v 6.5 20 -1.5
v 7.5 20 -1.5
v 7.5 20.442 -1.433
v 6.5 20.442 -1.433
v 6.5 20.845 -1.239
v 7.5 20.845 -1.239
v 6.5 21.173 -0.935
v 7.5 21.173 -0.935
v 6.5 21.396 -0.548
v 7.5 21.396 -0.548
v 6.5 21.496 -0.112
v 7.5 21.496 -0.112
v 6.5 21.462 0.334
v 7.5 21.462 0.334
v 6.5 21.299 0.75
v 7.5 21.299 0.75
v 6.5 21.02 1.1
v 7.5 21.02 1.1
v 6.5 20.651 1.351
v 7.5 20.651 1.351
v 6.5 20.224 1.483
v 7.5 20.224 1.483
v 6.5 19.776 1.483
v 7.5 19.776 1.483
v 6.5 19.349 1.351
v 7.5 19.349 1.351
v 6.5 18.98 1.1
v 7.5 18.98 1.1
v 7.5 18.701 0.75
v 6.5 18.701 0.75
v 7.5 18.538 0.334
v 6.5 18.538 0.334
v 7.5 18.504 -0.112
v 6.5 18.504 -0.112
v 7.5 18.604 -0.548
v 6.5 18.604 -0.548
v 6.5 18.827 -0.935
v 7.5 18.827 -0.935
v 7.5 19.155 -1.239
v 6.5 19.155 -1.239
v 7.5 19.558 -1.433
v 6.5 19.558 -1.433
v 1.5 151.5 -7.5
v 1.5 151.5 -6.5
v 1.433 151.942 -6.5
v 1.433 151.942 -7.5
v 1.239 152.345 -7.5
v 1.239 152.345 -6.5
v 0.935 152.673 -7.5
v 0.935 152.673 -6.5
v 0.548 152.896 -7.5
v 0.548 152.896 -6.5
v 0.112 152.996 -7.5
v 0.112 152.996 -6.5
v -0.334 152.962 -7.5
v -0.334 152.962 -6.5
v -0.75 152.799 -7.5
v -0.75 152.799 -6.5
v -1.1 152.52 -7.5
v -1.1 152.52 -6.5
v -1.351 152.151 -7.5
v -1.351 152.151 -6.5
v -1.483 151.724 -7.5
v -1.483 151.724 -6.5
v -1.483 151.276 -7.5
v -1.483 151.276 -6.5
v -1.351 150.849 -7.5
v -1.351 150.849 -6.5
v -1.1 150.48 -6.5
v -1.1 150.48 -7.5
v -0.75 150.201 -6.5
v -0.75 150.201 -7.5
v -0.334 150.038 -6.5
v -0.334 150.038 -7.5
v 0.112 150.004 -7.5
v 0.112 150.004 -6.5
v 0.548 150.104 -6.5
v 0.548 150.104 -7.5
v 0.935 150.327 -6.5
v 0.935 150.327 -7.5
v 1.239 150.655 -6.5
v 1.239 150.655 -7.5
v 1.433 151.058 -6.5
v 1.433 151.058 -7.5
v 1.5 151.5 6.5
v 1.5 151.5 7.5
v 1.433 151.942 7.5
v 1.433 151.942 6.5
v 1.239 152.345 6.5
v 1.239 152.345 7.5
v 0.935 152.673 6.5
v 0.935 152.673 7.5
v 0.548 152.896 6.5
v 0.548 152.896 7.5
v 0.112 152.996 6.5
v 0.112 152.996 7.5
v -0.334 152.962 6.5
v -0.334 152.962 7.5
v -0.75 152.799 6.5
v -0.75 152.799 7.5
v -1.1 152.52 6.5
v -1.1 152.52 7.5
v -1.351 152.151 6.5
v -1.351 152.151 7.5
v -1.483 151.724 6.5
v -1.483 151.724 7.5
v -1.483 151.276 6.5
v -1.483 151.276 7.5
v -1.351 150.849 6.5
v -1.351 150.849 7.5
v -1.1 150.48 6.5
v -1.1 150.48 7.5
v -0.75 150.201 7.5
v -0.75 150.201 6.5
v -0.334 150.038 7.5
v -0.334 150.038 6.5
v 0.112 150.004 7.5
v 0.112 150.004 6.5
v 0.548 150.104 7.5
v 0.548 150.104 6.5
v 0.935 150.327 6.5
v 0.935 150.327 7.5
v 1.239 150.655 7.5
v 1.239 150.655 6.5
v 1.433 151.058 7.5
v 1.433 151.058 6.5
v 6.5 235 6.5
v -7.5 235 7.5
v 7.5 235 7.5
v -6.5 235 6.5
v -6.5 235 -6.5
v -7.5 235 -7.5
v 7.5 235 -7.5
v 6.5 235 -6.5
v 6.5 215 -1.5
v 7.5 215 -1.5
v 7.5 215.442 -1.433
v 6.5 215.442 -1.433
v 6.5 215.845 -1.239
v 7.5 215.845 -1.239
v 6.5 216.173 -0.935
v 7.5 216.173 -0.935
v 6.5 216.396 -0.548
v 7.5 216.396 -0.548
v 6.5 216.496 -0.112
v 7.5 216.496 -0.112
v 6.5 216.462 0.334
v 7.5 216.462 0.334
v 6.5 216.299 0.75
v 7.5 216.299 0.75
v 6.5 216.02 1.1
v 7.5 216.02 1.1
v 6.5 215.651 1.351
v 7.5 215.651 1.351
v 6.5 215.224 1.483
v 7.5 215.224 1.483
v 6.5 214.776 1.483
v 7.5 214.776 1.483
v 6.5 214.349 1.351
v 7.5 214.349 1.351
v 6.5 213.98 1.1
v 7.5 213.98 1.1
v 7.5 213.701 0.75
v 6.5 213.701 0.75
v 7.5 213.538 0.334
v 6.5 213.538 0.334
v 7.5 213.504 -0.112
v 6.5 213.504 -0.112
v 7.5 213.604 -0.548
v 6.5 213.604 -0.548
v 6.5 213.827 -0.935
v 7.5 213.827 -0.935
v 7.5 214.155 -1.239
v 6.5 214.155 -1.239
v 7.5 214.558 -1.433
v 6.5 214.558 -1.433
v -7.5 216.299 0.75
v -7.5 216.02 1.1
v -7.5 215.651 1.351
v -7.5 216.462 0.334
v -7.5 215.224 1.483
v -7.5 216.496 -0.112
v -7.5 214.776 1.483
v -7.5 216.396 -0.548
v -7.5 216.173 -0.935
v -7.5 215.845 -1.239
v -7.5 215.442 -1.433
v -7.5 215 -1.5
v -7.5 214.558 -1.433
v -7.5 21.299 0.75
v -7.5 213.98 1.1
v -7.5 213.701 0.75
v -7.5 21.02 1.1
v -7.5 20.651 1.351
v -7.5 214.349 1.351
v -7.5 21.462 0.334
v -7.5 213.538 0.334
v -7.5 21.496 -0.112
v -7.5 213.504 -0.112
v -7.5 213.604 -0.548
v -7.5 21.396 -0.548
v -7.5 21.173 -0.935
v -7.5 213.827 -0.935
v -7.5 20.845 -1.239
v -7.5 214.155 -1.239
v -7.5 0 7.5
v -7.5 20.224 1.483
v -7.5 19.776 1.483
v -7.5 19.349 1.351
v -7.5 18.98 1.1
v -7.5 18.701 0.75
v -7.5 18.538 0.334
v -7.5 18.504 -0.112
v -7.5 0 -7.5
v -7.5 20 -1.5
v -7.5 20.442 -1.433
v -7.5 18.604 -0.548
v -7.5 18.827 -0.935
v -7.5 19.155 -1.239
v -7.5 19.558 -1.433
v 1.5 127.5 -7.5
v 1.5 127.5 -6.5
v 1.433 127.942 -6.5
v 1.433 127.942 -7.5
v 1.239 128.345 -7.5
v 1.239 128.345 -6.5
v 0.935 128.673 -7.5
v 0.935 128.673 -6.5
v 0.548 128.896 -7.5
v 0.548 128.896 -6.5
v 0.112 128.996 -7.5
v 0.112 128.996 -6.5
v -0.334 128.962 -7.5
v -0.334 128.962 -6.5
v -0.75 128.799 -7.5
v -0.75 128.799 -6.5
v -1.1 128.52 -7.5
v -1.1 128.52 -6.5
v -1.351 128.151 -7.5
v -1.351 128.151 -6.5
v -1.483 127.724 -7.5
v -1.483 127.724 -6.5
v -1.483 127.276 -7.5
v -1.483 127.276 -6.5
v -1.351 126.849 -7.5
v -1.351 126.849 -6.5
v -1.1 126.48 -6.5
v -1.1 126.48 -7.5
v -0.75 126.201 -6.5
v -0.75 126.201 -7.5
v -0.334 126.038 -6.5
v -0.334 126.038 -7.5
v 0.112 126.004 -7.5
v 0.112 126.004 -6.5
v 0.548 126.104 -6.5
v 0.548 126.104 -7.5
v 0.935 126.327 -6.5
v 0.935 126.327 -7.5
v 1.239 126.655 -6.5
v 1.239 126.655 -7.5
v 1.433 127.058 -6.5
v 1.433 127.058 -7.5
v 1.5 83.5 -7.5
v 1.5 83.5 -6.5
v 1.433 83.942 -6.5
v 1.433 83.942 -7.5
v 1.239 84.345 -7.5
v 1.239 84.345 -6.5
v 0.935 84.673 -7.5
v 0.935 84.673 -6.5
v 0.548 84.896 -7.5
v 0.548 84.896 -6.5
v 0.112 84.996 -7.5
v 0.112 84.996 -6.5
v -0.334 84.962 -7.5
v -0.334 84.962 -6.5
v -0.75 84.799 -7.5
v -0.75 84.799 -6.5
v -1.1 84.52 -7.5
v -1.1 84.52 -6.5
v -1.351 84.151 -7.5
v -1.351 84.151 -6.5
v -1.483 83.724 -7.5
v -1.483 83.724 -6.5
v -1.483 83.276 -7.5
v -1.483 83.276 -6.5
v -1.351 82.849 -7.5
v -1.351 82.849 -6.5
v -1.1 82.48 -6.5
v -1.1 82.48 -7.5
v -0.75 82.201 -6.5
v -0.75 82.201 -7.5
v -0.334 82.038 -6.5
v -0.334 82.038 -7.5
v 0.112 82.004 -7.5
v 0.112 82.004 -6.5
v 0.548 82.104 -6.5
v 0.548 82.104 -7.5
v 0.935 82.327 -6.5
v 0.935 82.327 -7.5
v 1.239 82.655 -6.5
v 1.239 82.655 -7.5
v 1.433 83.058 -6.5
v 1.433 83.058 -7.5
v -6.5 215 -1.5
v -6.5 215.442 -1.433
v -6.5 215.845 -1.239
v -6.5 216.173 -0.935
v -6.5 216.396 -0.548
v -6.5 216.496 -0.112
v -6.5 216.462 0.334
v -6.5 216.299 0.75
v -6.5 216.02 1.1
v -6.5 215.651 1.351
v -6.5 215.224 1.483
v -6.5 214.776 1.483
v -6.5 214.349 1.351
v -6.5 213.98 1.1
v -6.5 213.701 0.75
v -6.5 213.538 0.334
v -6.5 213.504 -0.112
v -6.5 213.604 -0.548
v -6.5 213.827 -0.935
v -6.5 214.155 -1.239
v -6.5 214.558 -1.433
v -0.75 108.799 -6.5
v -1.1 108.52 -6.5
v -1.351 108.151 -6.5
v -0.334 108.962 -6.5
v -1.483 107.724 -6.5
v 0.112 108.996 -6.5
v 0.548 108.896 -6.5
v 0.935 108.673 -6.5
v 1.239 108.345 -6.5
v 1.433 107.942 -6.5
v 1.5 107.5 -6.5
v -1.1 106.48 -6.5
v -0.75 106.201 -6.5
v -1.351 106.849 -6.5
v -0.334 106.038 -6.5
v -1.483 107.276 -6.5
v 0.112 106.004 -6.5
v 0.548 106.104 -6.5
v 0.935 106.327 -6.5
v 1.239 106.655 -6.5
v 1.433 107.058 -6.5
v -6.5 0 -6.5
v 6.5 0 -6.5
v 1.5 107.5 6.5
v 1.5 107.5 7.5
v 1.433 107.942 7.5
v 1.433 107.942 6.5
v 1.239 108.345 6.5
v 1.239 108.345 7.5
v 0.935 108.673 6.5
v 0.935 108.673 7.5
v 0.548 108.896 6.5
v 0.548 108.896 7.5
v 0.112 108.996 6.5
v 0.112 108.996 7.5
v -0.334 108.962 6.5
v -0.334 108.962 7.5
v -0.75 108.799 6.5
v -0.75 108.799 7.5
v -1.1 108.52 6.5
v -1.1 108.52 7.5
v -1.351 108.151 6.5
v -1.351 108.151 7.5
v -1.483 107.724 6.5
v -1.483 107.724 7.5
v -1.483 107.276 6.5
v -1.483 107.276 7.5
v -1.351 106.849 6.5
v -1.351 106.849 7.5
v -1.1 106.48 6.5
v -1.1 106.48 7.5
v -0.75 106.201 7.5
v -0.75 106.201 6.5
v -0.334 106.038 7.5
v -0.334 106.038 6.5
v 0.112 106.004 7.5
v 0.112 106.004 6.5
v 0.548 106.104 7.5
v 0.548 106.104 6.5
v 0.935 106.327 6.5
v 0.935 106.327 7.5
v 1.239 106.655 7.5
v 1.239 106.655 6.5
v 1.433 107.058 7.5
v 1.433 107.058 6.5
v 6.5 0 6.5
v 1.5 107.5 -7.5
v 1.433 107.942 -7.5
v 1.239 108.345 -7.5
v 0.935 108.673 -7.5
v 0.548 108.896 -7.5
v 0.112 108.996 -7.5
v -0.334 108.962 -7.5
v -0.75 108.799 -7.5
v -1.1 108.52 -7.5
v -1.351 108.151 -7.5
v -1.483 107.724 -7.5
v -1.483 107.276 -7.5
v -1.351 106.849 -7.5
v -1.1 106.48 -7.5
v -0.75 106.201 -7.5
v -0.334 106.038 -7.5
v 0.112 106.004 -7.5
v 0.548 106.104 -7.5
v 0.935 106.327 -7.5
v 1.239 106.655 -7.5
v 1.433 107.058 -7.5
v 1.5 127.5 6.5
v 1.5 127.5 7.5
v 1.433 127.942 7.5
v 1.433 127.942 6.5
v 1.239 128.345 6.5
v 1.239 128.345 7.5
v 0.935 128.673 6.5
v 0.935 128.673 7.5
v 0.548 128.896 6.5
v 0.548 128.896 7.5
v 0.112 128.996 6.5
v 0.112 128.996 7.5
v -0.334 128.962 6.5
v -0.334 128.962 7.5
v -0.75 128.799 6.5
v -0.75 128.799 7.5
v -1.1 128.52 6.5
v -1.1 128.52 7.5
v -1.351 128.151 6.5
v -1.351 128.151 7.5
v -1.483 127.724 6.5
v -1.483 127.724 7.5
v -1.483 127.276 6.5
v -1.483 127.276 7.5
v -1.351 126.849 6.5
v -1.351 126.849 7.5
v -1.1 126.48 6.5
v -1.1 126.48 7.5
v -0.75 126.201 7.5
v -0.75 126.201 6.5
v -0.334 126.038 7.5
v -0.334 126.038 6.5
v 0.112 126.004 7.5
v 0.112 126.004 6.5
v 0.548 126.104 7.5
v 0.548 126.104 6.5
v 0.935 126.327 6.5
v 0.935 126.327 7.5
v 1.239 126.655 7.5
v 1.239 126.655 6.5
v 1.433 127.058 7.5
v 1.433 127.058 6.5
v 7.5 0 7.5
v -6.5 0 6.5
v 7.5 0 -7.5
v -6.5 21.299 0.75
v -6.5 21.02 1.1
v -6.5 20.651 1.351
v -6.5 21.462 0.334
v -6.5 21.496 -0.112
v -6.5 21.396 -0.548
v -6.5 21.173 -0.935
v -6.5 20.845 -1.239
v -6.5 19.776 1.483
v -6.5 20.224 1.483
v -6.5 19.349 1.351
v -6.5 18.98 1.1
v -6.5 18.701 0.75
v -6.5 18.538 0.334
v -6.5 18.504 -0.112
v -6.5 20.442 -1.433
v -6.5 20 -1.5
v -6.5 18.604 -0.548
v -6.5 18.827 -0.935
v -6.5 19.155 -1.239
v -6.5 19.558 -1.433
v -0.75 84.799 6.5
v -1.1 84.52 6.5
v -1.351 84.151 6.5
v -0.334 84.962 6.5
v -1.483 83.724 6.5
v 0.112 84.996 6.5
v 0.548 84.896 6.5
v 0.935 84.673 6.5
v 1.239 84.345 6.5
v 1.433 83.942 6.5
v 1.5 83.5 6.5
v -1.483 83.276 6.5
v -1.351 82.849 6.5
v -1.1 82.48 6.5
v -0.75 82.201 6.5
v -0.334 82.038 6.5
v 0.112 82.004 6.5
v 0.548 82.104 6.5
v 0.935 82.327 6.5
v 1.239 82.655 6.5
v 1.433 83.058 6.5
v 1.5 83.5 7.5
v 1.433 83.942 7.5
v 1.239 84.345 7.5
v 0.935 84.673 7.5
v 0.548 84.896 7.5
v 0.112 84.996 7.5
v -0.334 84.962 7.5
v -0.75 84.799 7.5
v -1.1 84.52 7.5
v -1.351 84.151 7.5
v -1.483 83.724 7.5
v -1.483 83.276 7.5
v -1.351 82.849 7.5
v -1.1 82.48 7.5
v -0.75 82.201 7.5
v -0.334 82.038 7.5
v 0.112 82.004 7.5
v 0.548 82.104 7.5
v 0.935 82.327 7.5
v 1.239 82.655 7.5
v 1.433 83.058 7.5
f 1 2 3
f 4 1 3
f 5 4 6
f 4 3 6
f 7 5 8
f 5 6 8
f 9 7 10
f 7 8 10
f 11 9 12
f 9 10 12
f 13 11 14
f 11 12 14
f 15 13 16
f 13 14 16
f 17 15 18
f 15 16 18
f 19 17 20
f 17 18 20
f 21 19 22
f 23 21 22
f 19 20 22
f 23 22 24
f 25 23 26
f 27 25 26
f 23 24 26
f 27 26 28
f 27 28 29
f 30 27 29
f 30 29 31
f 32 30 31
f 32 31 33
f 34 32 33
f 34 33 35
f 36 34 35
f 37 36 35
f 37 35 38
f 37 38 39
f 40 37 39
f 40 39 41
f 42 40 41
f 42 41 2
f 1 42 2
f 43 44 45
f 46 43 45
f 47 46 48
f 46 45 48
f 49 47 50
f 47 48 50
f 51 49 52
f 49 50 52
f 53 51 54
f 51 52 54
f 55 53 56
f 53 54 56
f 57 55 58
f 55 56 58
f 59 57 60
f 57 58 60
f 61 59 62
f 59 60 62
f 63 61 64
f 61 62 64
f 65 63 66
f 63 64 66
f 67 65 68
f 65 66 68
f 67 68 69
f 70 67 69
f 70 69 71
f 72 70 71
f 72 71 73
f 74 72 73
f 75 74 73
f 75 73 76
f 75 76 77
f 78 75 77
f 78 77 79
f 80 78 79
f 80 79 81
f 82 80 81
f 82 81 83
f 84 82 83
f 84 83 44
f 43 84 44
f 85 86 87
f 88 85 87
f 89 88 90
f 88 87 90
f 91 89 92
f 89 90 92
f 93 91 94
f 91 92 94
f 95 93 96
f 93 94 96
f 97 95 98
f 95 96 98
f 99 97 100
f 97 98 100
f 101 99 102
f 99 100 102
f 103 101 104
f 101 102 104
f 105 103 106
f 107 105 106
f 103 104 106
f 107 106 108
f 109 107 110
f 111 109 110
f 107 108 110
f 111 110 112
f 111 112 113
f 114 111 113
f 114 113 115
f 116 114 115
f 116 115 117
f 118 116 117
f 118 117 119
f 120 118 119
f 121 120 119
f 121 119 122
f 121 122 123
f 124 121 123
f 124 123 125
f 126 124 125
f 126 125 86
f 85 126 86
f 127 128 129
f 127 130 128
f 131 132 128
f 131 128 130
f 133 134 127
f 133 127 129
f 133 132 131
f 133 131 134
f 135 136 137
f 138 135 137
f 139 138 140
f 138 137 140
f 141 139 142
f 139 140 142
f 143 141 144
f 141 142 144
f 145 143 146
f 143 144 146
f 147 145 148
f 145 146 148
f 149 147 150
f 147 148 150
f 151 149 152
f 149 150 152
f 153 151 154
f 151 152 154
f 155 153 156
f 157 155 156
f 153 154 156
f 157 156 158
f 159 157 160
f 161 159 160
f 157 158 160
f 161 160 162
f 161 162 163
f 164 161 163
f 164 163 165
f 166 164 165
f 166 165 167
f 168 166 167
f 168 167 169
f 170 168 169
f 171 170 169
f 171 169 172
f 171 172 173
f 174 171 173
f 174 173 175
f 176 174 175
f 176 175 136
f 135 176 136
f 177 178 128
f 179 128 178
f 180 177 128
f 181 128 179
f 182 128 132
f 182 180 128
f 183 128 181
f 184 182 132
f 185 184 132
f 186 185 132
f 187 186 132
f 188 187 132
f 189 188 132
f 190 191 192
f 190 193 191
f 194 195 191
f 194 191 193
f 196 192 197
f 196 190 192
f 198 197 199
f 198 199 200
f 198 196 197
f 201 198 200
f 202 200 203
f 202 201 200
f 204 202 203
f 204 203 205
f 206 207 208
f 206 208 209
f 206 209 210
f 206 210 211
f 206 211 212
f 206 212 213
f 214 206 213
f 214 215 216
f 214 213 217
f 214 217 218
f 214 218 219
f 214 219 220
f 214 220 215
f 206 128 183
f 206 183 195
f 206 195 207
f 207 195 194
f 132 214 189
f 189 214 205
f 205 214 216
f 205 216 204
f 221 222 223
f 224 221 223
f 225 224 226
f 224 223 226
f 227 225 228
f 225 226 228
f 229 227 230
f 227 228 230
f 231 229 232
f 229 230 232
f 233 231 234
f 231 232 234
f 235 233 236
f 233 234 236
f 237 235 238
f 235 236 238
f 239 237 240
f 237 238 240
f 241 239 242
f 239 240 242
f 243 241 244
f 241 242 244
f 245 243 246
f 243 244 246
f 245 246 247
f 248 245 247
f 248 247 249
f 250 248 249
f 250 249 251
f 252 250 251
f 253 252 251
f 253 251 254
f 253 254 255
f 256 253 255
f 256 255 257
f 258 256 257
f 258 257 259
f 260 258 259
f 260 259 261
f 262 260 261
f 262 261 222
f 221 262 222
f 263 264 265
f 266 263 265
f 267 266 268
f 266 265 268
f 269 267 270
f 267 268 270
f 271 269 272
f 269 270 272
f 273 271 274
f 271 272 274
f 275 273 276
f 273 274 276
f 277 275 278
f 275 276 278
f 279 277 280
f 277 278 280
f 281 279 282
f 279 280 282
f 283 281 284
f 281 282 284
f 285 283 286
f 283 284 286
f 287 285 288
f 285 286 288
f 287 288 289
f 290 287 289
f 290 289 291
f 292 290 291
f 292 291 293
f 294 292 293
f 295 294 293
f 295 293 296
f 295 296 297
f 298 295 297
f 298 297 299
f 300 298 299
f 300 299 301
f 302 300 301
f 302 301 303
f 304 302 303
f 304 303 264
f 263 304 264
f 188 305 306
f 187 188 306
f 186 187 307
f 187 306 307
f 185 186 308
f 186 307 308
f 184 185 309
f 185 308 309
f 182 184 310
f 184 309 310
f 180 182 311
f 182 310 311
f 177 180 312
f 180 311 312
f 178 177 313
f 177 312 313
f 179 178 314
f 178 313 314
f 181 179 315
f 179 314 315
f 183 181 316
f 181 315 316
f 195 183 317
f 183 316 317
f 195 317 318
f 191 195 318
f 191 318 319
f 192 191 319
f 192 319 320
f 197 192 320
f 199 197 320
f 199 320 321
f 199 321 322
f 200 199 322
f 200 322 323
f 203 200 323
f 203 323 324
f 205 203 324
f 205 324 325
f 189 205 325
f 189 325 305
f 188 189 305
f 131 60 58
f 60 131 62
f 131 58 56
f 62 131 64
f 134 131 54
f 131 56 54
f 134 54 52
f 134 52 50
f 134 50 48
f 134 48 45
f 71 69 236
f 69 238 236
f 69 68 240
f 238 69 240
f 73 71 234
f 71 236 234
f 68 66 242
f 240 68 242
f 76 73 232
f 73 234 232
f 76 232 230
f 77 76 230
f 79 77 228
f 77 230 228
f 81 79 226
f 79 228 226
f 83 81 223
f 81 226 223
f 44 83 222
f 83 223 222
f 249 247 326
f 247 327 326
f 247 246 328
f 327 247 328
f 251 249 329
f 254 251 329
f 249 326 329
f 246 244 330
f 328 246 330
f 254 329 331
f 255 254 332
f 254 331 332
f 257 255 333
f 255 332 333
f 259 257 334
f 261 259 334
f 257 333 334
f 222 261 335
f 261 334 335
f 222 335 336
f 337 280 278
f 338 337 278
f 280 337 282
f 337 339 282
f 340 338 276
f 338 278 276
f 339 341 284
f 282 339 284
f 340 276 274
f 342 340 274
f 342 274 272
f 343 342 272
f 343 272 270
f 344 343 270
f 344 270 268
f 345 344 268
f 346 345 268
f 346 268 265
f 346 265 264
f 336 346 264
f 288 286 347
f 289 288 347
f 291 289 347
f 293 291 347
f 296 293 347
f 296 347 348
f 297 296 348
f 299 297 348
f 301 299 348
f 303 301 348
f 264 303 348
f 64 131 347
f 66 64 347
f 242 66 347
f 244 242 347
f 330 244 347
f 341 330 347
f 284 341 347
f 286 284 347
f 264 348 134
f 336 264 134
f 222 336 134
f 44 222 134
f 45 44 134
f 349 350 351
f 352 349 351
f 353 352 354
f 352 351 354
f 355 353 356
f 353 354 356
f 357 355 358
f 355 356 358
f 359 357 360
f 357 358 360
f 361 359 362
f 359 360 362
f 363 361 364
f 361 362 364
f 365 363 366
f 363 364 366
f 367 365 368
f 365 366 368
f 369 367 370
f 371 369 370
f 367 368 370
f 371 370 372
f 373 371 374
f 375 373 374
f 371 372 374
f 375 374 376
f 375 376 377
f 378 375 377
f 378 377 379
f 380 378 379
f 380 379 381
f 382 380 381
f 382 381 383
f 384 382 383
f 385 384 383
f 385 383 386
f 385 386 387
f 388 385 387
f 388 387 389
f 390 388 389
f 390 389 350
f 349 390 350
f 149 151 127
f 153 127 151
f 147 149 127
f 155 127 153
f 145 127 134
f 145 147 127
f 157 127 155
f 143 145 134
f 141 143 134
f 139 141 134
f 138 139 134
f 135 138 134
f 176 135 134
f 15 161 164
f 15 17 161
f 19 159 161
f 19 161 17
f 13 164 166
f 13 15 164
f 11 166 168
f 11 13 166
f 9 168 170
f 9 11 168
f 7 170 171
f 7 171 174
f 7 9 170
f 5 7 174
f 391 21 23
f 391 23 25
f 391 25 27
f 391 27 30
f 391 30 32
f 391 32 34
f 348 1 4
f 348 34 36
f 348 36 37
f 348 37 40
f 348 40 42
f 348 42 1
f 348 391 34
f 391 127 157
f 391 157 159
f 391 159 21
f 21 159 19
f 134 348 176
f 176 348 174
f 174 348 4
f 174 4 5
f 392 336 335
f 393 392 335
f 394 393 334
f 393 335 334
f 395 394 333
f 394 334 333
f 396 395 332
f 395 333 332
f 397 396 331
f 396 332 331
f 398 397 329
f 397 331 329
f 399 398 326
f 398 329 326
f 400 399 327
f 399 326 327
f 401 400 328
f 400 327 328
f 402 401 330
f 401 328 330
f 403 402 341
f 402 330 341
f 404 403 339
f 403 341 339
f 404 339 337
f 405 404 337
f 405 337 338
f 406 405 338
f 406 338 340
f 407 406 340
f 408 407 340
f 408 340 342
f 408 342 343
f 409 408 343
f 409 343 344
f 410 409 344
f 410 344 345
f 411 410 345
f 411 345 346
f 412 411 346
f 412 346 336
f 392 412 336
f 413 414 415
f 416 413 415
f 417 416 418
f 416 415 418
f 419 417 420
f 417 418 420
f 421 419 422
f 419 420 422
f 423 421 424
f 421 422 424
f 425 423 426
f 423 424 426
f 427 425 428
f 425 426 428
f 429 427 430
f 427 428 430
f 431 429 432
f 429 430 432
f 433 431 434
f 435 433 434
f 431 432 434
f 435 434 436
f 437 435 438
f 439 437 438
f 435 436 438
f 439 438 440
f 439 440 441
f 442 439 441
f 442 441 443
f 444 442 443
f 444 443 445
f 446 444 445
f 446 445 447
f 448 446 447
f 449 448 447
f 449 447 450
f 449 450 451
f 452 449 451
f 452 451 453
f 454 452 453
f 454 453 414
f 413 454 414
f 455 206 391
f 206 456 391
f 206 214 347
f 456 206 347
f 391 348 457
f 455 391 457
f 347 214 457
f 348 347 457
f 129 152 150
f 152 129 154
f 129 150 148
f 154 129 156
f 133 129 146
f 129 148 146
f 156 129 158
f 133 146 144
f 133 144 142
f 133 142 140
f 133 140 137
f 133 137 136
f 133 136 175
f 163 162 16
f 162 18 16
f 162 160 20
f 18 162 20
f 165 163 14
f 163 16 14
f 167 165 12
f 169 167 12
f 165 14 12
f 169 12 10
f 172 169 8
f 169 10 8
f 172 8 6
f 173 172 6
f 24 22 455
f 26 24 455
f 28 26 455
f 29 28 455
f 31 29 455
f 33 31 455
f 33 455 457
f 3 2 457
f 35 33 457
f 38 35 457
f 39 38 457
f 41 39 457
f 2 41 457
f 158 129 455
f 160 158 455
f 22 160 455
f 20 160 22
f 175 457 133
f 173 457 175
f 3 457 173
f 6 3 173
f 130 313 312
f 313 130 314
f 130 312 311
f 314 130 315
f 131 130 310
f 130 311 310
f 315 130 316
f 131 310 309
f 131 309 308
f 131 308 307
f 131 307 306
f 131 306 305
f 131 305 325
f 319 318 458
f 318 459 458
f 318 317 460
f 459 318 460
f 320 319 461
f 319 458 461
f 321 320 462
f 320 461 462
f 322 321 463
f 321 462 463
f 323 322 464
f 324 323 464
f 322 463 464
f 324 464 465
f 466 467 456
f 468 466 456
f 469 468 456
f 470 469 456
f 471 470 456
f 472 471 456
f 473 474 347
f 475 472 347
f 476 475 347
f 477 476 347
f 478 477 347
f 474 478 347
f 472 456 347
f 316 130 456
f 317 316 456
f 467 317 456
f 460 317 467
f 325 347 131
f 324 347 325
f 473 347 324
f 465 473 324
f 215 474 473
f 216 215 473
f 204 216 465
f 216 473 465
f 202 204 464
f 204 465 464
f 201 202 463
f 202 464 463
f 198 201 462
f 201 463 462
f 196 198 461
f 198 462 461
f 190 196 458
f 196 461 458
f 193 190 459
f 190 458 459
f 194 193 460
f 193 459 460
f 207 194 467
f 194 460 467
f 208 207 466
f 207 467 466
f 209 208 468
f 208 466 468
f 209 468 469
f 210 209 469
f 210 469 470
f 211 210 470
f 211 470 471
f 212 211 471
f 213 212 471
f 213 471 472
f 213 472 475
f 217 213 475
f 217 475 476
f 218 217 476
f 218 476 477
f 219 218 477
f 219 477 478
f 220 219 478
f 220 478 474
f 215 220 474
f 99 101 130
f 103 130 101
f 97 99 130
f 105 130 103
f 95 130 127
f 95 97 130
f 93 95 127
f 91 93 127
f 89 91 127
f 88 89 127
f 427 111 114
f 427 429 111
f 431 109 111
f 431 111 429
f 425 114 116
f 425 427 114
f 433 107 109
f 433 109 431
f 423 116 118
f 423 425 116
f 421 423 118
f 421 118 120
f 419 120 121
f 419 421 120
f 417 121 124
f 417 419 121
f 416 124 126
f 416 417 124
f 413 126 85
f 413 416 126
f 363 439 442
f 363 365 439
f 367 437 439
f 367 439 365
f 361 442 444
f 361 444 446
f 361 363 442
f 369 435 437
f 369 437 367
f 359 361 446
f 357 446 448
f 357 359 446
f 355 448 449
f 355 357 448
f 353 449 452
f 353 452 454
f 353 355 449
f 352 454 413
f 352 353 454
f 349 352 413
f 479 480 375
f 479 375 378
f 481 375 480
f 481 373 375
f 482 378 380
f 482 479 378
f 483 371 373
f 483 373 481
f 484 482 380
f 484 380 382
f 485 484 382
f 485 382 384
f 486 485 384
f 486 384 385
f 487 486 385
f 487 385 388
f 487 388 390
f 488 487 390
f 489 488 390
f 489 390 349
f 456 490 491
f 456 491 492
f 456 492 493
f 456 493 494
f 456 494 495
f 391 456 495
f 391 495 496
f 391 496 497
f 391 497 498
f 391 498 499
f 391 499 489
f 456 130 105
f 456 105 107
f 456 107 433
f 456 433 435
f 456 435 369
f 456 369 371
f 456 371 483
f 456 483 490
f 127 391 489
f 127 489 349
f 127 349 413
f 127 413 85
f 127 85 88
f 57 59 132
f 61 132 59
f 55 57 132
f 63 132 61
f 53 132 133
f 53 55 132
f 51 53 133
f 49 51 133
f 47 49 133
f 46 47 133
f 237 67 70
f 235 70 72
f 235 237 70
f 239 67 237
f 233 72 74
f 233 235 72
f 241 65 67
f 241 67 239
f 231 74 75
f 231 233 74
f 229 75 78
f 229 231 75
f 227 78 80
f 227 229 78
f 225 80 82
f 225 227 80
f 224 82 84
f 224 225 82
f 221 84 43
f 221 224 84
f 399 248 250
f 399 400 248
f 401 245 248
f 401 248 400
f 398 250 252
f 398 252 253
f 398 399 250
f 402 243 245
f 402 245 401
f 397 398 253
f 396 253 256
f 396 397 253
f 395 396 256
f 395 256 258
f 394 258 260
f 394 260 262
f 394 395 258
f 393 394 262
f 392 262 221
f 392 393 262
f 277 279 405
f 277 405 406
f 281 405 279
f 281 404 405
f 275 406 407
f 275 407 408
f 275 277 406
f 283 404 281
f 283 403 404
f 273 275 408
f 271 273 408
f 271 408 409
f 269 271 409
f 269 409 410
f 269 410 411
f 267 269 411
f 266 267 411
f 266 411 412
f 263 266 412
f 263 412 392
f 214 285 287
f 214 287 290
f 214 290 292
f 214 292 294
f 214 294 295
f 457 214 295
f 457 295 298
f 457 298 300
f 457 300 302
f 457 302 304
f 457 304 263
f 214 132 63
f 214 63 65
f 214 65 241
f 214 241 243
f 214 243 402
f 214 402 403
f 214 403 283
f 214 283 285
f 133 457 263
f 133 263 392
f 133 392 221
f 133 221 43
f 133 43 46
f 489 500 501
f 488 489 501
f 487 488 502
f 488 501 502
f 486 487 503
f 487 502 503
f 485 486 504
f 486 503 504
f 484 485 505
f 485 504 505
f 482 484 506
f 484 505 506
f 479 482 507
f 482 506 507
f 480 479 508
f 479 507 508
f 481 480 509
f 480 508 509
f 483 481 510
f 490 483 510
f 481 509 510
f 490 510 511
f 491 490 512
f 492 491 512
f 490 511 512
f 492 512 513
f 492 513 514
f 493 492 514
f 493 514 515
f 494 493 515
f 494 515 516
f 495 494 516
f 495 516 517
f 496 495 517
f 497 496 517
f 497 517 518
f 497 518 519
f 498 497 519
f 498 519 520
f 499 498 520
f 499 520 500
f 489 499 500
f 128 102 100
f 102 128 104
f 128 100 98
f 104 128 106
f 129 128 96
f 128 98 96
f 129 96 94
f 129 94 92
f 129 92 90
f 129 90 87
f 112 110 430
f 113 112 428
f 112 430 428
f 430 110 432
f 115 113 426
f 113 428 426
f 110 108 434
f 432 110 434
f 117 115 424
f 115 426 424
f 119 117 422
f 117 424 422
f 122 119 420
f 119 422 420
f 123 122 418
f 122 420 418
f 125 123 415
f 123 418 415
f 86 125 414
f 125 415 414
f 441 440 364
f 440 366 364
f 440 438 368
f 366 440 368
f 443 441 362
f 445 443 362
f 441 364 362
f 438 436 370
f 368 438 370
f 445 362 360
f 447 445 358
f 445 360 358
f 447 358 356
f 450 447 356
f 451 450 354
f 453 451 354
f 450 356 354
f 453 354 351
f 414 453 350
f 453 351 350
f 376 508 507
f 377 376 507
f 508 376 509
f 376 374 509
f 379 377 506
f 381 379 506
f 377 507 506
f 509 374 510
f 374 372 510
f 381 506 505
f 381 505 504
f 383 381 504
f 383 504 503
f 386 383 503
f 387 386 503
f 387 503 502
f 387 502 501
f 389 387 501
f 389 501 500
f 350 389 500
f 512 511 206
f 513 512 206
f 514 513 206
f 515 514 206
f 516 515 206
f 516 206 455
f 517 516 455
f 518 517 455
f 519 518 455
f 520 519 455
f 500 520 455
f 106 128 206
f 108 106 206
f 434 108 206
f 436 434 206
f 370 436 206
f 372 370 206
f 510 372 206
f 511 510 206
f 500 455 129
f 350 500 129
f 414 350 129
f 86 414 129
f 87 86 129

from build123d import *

# Parameters (mm, degrees)
SKETCH_1_W          = 15
SKETCH_1_H          = 15
SKETCH_1_W_2        = 13
SKETCH_1_H_2        = 13
EXTRUDE_1_DEPTH     = 235
SKETCH_2_R          = 1.5
CUT_EXTRUDE_1_DEPTH = 236.597644301
SKETCH_3_R          = 1.5
CUT_EXTRUDE_2_DEPTH = 236.597644301


with BuildPart() as part:
    # 草图1 → 凸台-拉伸1 (new body)
    with BuildSketch(Plane(origin=(0, 0, 0), x_dir=(1, 0, 0), z_dir=(0, 1, 0))):
        Rectangle(SKETCH_1_W, SKETCH_1_H)
        Rectangle(SKETCH_1_W_2, SKETCH_1_H_2, mode=Mode.SUBTRACT)
    extrude(amount=EXTRUDE_1_DEPTH)

    # 草图2 → 切除-拉伸1 (cut, through all)
    with BuildSketch(Plane.XY.offset(7.5)):
        with Locations((0, 127.5)):
            Circle(SKETCH_2_R)
        with Locations((0, 107.5)):
            Circle(SKETCH_2_R)
        with Locations((0, 151.5)):
            Circle(SKETCH_2_R)
        with Locations((0, 83.5)):
            Circle(SKETCH_2_R)
    extrude(amount=-CUT_EXTRUDE_1_DEPTH, mode=Mode.SUBTRACT)

    # 草图3 → 切除-拉伸2 (cut, through all)
    with BuildSketch(Plane(origin=(7.5, 0, 0), x_dir=(0, 0, -1), z_dir=(1, 0, 0))):
        with Locations((0, 215)):
            Circle(SKETCH_3_R)
        with Locations((0, 20)):
            Circle(SKETCH_3_R)
    extrude(amount=-CUT_EXTRUDE_2_DEPTH, mode=Mode.SUBTRACT)


solid = part.part
